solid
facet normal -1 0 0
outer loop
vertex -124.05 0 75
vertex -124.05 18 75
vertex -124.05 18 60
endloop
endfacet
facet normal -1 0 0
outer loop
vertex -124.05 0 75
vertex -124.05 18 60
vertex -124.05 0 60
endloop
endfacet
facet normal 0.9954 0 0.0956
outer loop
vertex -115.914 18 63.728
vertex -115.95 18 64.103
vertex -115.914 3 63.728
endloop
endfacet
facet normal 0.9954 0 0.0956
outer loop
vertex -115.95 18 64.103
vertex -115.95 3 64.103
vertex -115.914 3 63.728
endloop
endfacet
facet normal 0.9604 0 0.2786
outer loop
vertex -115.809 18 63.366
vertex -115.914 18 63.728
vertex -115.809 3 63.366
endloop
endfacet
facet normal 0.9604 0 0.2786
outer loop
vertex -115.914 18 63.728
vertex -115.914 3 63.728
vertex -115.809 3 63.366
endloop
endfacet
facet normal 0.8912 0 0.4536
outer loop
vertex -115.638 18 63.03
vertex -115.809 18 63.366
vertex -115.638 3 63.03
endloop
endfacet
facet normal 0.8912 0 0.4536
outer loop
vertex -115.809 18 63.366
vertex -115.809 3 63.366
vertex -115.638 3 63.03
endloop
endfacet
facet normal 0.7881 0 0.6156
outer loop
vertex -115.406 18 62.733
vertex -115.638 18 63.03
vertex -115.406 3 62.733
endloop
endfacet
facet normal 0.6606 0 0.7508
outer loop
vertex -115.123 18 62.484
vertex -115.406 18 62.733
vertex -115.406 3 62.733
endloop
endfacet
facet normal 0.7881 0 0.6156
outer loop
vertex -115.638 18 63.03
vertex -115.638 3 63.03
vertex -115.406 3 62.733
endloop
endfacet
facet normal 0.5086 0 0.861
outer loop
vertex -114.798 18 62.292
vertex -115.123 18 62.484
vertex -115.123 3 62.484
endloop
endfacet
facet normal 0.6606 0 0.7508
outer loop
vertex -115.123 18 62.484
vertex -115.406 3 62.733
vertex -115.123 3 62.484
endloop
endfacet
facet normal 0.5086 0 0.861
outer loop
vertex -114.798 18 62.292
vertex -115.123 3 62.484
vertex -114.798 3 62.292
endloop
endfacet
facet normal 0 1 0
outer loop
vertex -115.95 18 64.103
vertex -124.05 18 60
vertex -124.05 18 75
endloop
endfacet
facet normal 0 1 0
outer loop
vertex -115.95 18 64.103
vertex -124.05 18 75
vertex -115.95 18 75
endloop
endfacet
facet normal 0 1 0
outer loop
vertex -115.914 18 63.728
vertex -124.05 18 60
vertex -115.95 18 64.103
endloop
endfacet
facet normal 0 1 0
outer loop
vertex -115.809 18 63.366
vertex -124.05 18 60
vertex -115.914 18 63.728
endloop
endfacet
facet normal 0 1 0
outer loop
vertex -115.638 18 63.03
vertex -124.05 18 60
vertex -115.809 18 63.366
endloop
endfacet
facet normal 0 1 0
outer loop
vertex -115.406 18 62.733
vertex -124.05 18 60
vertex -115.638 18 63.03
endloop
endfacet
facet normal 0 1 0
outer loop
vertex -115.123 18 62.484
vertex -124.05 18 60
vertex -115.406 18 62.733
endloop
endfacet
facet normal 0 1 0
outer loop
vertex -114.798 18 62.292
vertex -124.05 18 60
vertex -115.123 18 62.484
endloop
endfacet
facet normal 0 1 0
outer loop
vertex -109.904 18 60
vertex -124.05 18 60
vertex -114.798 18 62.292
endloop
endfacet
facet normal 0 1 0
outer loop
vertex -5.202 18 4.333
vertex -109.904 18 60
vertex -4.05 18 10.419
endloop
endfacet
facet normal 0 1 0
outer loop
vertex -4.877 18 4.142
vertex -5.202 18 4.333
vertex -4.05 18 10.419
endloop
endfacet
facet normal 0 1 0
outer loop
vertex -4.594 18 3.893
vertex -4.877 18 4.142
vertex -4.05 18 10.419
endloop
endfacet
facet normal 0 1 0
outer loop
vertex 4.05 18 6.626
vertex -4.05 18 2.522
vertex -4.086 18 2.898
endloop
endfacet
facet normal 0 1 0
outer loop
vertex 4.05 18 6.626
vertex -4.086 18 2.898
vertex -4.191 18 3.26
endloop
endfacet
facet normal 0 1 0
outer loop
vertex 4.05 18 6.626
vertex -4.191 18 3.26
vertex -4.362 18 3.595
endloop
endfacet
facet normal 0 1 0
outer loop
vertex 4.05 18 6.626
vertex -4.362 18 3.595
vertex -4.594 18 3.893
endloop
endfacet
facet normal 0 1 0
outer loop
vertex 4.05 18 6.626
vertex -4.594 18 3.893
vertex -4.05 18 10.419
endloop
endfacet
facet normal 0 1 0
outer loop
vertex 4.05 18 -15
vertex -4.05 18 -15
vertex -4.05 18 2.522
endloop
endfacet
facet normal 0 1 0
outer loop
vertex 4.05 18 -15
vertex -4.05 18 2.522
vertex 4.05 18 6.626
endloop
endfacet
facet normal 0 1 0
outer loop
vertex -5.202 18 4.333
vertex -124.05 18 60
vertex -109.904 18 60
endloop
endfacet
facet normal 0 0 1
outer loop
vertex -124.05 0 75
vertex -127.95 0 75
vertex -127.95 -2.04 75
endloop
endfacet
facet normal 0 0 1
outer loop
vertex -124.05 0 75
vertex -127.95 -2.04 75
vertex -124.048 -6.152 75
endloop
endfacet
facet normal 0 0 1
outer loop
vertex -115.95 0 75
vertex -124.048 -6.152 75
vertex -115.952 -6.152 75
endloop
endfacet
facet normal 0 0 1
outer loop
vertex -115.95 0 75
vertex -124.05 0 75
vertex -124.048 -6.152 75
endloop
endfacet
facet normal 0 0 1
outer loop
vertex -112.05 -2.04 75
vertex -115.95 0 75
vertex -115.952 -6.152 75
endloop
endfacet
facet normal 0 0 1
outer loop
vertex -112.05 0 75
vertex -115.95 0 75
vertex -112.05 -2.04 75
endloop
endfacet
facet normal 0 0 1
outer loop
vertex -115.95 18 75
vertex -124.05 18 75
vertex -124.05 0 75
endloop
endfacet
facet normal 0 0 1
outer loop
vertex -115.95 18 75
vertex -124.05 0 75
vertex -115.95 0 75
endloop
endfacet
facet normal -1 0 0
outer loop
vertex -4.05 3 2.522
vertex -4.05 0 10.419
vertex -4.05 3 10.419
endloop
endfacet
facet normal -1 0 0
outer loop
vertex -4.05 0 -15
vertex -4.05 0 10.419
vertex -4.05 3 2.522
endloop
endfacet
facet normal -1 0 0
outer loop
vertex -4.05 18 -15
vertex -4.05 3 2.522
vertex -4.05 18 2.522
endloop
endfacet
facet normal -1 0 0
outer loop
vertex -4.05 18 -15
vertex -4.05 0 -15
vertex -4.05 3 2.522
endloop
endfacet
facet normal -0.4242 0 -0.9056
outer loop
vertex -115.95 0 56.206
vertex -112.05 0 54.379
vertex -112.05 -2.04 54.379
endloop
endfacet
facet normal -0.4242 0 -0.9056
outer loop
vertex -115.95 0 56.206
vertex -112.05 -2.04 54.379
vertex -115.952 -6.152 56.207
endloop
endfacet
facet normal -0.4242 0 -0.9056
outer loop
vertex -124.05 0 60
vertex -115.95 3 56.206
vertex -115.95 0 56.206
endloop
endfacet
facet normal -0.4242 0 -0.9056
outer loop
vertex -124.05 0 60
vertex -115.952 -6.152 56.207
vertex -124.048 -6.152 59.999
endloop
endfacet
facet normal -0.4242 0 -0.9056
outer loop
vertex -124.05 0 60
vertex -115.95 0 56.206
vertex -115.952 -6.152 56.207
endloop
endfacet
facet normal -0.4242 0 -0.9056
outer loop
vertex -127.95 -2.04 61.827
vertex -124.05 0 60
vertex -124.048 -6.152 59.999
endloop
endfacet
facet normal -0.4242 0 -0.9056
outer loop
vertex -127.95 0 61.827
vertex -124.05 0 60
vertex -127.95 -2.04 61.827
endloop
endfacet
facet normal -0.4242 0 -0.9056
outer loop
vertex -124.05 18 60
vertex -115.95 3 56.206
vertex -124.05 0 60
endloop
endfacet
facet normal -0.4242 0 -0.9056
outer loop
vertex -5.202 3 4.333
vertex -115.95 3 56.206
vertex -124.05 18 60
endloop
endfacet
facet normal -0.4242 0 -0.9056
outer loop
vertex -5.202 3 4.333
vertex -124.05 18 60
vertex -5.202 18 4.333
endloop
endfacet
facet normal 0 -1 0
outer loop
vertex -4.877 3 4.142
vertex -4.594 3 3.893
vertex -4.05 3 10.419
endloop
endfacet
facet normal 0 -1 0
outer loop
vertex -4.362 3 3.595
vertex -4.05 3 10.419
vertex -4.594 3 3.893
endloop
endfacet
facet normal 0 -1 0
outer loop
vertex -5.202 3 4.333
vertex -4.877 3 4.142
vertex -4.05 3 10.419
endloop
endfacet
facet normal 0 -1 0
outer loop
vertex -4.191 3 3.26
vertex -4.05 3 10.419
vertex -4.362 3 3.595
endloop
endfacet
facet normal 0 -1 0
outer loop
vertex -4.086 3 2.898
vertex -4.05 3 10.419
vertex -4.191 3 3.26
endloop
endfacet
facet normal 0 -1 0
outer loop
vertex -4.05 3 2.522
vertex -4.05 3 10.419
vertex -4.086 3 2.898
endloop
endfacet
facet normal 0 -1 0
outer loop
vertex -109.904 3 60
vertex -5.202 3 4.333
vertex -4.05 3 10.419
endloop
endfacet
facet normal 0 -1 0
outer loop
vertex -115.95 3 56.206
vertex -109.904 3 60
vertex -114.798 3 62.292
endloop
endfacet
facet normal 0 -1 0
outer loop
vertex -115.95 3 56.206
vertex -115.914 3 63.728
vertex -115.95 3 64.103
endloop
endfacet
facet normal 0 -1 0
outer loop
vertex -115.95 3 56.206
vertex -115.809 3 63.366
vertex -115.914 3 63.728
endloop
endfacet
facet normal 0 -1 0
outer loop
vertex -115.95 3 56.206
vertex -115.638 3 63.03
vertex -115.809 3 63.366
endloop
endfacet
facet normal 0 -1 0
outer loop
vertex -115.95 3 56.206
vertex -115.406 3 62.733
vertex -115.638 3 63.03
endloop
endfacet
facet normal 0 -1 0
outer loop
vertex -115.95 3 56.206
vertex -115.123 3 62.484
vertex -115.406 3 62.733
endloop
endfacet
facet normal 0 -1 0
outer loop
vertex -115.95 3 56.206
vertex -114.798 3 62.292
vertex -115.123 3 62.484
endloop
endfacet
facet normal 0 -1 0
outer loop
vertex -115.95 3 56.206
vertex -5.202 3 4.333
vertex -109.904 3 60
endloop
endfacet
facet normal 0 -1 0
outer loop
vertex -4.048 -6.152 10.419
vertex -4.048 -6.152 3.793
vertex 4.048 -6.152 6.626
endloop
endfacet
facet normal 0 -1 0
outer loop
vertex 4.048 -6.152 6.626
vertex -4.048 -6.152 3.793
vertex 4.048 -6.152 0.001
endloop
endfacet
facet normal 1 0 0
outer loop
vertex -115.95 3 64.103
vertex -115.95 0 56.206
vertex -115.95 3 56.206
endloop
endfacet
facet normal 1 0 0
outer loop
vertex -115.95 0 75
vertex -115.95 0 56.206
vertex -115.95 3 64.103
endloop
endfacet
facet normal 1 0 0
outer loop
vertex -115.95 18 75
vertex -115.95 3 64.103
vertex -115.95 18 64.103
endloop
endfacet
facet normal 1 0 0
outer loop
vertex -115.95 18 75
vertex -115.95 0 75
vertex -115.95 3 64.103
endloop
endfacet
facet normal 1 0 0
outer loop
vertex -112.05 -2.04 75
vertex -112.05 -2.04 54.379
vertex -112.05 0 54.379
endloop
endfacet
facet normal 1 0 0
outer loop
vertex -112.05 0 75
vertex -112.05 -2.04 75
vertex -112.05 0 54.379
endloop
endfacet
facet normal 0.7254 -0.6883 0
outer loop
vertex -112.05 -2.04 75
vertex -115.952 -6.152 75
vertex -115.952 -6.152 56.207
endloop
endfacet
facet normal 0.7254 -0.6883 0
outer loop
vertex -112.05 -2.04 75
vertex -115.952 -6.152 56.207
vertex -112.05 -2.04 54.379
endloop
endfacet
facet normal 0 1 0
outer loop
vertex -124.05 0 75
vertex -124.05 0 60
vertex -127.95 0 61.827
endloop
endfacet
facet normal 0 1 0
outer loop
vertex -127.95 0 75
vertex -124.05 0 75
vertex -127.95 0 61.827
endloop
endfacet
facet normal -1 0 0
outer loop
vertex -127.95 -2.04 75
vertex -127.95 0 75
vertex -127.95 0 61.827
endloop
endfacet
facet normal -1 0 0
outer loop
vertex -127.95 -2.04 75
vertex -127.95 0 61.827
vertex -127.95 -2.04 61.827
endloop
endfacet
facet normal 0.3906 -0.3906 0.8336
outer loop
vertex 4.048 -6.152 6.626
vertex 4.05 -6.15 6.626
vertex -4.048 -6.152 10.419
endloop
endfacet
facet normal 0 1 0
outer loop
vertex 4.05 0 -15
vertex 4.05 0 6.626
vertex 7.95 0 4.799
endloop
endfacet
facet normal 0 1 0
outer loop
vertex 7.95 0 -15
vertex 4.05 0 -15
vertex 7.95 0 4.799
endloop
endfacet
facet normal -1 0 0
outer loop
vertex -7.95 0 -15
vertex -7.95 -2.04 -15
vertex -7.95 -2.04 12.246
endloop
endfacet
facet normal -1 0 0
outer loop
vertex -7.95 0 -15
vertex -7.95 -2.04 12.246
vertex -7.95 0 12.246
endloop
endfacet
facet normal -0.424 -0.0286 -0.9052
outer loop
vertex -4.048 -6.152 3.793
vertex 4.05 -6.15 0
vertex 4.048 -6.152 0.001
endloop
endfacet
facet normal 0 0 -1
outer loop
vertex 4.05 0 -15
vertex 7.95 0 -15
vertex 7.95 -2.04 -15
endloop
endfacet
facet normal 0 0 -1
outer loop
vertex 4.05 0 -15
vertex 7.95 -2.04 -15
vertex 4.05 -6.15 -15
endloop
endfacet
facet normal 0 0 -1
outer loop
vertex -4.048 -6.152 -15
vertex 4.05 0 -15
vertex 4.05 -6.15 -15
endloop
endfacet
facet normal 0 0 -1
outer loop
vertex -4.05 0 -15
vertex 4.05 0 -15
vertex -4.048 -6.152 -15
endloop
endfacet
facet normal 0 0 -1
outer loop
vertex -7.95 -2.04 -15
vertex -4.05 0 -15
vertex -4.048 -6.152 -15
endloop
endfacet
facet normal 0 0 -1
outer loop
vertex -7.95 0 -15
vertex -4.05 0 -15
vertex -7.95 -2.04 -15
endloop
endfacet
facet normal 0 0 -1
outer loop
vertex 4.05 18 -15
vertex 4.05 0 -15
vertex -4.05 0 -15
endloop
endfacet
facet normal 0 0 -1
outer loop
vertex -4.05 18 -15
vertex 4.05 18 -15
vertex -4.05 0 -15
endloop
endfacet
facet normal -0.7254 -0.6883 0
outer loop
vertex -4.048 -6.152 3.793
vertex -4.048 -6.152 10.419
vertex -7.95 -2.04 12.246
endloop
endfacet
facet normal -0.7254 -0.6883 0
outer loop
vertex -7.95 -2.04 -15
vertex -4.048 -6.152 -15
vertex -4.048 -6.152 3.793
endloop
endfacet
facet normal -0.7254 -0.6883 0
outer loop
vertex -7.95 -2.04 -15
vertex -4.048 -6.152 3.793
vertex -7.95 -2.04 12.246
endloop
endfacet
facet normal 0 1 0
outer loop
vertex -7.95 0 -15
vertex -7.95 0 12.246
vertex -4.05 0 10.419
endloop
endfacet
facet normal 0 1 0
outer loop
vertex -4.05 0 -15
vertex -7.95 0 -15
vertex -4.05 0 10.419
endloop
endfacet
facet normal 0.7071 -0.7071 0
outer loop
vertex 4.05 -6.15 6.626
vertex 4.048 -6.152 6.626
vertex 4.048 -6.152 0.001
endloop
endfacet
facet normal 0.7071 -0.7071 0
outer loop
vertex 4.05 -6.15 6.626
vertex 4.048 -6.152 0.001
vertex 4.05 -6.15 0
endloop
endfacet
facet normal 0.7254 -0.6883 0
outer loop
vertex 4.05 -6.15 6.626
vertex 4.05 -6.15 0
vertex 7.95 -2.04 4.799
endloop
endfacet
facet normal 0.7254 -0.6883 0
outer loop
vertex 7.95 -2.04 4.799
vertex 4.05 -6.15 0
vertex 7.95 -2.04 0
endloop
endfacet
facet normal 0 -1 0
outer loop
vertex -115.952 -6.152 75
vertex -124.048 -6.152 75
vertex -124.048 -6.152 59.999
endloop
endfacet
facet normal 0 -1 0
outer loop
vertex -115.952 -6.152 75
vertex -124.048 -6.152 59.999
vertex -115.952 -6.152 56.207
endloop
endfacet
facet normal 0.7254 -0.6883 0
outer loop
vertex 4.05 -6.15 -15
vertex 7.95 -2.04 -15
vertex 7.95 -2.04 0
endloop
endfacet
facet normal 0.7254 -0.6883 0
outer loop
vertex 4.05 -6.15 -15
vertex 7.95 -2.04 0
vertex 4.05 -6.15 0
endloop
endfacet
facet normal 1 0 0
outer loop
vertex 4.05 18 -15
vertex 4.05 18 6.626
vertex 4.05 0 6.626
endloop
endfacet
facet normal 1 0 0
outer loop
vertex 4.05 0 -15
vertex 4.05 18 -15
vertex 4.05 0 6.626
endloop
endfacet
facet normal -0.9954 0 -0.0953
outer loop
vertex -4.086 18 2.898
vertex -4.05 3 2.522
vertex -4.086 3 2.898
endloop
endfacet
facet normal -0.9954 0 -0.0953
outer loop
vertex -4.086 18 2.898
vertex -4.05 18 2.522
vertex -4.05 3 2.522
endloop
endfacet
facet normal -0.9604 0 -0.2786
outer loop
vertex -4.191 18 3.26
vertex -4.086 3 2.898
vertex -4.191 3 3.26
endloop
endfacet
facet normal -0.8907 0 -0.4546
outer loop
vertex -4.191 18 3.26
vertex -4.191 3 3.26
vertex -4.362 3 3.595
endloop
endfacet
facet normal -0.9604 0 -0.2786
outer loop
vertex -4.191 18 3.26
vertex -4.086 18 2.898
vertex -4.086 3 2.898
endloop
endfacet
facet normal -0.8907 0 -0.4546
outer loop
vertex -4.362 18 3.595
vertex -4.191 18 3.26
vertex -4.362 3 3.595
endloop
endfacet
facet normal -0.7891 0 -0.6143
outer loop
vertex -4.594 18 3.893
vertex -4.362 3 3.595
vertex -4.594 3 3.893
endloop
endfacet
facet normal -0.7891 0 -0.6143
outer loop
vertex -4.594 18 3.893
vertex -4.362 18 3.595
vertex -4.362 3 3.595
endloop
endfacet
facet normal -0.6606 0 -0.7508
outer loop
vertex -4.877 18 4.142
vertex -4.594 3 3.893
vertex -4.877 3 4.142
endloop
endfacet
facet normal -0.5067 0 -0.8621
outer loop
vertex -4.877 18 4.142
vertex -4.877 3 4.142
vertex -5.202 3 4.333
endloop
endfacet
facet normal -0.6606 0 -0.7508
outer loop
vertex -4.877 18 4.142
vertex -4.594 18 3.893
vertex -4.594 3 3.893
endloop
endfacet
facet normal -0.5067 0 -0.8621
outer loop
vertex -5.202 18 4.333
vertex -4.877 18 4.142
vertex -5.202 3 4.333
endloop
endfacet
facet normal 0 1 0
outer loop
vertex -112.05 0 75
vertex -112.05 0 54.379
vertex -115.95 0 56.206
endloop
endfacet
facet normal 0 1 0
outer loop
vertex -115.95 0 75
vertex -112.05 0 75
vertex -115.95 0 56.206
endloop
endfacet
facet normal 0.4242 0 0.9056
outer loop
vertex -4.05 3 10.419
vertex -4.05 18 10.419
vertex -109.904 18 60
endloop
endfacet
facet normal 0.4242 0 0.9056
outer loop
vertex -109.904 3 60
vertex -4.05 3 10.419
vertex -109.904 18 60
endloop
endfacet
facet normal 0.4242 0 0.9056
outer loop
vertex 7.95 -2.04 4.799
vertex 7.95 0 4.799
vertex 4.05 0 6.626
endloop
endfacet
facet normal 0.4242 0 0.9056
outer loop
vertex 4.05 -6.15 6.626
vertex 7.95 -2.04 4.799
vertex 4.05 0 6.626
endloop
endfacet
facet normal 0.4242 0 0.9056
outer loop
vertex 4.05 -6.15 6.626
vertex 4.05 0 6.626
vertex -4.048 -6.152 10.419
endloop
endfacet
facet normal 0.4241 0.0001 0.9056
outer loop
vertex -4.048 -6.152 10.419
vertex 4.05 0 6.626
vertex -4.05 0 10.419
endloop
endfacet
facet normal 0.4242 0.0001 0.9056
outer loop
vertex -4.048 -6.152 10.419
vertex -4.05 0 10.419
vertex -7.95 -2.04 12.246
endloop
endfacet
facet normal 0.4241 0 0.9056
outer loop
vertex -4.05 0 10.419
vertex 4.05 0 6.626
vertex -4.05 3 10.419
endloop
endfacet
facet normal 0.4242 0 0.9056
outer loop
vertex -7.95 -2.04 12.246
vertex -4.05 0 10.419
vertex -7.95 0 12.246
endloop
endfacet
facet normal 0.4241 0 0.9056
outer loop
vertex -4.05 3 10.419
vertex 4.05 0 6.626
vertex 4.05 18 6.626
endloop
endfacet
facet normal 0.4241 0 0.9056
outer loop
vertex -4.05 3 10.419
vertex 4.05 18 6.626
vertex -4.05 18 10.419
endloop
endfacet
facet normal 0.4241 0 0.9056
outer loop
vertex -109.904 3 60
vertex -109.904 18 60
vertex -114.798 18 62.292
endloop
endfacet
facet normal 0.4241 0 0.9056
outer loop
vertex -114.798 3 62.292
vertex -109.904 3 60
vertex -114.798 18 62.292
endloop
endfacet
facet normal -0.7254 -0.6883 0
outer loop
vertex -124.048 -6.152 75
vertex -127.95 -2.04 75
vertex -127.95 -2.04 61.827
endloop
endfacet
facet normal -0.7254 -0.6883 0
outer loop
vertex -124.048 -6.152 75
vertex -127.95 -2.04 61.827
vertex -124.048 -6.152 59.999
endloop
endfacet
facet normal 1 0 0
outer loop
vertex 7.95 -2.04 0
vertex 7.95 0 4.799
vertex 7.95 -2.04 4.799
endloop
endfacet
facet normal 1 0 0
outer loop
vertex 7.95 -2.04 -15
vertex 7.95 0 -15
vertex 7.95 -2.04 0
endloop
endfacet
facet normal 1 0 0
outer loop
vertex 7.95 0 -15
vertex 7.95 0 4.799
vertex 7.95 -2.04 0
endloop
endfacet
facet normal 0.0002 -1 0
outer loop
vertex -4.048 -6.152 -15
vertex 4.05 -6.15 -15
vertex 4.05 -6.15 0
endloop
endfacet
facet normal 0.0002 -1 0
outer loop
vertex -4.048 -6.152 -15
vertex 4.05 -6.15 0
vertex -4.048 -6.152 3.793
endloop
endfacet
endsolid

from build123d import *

# Parameters (mm, degrees)
BOSS_EXTRUDE1_DEPTH = 60
CUT_EXTRUDE2_DEPTH  = 25.152414984
BOSS_EXTRUDE2_DEPTH = 15
CUT_EXTRUDE3_DEPTH  = 25.152414984
BOSS_EXTRUDE3_DEPTH = 15
BOSS_EXTRUDE4_DEPTH = 15
CUT_EXTRUDE4_DEPTH  = 25.152414984
FILLET1_R           = 2


with BuildPart() as part:
    # Sketch1 → Boss-Extrude1 (new body)
    with BuildSketch(Plane.XY):
        Polygon((4.05, 18), (-124.05, 18), (-124.05, 0), (-115.95, 0), (-115.95, 3), (-4.05, 3), (-4.05, 0), (-7.95, 0), (-7.95, -2.04), (-4.048, -6.152414984), (4.048, -6.152414984), (7.95, -2.04), (7.95, 0), (4.05, 0), align=None)
    extrude(amount=BOSS_EXTRUDE1_DEPTH)

    # Sketch2 → Cut-Extrude2 (cut, through all)
    with BuildSketch(Plane(origin=(0, 18, 0), x_dir=(1, 0, 0), z_dir=(0, 1, 0))):
        Polygon((4.05, -60), (4.05, -6.625542325), (-109.904467136, -60), align=None)
        Polygon((-124.05, -60), (4.05, 0), (-124.05, 0), align=None)
        Polygon((11.122904285, -3.312706594), (4.05, -6.625542325), (4.05, -60), (-109.904467136, -60), (-126.032958173, -67.554328354), (-83.616740574, -158.112952928), (53.539121883, -93.871331168), align=None)
    extrude(amount=-CUT_EXTRUDE2_DEPTH, mode=Mode.SUBTRACT)

    # Sketch3 → Boss-Extrude2 (add, symmetric)
    with BuildSketch(Plane.XY.offset(60)):
        Polygon((-124.05, 18), (-124.05, 0), (-127.95, 0), (-127.95, -2.04), (-124.048, -6.152414984), (-115.952, -6.152414984), (-112.05, -2.04), (-112.05, 0), (-115.95, 0), (-115.95, 3), (-115.95, 18), align=None)
    extrude(amount=BOSS_EXTRUDE2_DEPTH, both=True)

    # Sketch2<4> → Cut-Extrude3 (cut, through all)
    with BuildSketch(Plane(origin=(0, 18, 0), x_dir=(1, 0, 0), z_dir=(0, 1, 0))):
        Polygon((4.05, 0), (-128.577931229, -62.12081088), (-170.994148827, 28.437813693), (-38.366217599, 90.558624573), align=None)
    extrude(amount=-CUT_EXTRUDE3_DEPTH, mode=Mode.SUBTRACT)

    # Sketch4 → Boss-Extrude3 (add)
    with BuildSketch(Plane(origin=(0, 18, 0), x_dir=(1, 0, 0), z_dir=(0, 1, 0))):
        Polygon((-109.904467136, -60), (-115.95, -62.831631318), (-115.95, -60), align=None)
    extrude(amount=-BOSS_EXTRUDE3_DEPTH)

    # Sketch6 → Boss-Extrude4 (add, symmetric)
    with BuildSketch(Plane(origin=(0, 0, 0), x_dir=(-1, 0, 0), z_dir=(0, 0, -1))):
        Polygon((-4.05, 0), (-7.95, 0), (-7.95, -2.04), (-4.05, -6.150307134), (4.048, -6.152414984), (7.95, -2.04), (7.95, 0), (4.05, 0), (4.05, 3), (4.05, 18), (-4.05, 18), align=None)
    extrude(amount=BOSS_EXTRUDE4_DEPTH, both=True)

    # Sketch7 → Cut-Extrude4 (cut, through all)
    with BuildSketch(Plane(origin=(0, 18, 0), x_dir=(1, 0, 0), z_dir=(0, 1, 0))):
        Polygon((-7.95, -12.246151224), (-7.95, -15), (7.95, -15), (7.95, -4.798844433), align=None)
    extrude(amount=-CUT_EXTRUDE4_DEPTH, mode=Mode.SUBTRACT)

    # Fillet1
    fillet1_edges = [part.edges().sort_by_distance(p)[0] for p in [
        (-115.95, 10.5, 62.831631318),
        (-4.05, 10.5, 3.793911007),
    ]]
    fillet(fillet1_edges, radius=FILLET1_R)


solid = part.part
